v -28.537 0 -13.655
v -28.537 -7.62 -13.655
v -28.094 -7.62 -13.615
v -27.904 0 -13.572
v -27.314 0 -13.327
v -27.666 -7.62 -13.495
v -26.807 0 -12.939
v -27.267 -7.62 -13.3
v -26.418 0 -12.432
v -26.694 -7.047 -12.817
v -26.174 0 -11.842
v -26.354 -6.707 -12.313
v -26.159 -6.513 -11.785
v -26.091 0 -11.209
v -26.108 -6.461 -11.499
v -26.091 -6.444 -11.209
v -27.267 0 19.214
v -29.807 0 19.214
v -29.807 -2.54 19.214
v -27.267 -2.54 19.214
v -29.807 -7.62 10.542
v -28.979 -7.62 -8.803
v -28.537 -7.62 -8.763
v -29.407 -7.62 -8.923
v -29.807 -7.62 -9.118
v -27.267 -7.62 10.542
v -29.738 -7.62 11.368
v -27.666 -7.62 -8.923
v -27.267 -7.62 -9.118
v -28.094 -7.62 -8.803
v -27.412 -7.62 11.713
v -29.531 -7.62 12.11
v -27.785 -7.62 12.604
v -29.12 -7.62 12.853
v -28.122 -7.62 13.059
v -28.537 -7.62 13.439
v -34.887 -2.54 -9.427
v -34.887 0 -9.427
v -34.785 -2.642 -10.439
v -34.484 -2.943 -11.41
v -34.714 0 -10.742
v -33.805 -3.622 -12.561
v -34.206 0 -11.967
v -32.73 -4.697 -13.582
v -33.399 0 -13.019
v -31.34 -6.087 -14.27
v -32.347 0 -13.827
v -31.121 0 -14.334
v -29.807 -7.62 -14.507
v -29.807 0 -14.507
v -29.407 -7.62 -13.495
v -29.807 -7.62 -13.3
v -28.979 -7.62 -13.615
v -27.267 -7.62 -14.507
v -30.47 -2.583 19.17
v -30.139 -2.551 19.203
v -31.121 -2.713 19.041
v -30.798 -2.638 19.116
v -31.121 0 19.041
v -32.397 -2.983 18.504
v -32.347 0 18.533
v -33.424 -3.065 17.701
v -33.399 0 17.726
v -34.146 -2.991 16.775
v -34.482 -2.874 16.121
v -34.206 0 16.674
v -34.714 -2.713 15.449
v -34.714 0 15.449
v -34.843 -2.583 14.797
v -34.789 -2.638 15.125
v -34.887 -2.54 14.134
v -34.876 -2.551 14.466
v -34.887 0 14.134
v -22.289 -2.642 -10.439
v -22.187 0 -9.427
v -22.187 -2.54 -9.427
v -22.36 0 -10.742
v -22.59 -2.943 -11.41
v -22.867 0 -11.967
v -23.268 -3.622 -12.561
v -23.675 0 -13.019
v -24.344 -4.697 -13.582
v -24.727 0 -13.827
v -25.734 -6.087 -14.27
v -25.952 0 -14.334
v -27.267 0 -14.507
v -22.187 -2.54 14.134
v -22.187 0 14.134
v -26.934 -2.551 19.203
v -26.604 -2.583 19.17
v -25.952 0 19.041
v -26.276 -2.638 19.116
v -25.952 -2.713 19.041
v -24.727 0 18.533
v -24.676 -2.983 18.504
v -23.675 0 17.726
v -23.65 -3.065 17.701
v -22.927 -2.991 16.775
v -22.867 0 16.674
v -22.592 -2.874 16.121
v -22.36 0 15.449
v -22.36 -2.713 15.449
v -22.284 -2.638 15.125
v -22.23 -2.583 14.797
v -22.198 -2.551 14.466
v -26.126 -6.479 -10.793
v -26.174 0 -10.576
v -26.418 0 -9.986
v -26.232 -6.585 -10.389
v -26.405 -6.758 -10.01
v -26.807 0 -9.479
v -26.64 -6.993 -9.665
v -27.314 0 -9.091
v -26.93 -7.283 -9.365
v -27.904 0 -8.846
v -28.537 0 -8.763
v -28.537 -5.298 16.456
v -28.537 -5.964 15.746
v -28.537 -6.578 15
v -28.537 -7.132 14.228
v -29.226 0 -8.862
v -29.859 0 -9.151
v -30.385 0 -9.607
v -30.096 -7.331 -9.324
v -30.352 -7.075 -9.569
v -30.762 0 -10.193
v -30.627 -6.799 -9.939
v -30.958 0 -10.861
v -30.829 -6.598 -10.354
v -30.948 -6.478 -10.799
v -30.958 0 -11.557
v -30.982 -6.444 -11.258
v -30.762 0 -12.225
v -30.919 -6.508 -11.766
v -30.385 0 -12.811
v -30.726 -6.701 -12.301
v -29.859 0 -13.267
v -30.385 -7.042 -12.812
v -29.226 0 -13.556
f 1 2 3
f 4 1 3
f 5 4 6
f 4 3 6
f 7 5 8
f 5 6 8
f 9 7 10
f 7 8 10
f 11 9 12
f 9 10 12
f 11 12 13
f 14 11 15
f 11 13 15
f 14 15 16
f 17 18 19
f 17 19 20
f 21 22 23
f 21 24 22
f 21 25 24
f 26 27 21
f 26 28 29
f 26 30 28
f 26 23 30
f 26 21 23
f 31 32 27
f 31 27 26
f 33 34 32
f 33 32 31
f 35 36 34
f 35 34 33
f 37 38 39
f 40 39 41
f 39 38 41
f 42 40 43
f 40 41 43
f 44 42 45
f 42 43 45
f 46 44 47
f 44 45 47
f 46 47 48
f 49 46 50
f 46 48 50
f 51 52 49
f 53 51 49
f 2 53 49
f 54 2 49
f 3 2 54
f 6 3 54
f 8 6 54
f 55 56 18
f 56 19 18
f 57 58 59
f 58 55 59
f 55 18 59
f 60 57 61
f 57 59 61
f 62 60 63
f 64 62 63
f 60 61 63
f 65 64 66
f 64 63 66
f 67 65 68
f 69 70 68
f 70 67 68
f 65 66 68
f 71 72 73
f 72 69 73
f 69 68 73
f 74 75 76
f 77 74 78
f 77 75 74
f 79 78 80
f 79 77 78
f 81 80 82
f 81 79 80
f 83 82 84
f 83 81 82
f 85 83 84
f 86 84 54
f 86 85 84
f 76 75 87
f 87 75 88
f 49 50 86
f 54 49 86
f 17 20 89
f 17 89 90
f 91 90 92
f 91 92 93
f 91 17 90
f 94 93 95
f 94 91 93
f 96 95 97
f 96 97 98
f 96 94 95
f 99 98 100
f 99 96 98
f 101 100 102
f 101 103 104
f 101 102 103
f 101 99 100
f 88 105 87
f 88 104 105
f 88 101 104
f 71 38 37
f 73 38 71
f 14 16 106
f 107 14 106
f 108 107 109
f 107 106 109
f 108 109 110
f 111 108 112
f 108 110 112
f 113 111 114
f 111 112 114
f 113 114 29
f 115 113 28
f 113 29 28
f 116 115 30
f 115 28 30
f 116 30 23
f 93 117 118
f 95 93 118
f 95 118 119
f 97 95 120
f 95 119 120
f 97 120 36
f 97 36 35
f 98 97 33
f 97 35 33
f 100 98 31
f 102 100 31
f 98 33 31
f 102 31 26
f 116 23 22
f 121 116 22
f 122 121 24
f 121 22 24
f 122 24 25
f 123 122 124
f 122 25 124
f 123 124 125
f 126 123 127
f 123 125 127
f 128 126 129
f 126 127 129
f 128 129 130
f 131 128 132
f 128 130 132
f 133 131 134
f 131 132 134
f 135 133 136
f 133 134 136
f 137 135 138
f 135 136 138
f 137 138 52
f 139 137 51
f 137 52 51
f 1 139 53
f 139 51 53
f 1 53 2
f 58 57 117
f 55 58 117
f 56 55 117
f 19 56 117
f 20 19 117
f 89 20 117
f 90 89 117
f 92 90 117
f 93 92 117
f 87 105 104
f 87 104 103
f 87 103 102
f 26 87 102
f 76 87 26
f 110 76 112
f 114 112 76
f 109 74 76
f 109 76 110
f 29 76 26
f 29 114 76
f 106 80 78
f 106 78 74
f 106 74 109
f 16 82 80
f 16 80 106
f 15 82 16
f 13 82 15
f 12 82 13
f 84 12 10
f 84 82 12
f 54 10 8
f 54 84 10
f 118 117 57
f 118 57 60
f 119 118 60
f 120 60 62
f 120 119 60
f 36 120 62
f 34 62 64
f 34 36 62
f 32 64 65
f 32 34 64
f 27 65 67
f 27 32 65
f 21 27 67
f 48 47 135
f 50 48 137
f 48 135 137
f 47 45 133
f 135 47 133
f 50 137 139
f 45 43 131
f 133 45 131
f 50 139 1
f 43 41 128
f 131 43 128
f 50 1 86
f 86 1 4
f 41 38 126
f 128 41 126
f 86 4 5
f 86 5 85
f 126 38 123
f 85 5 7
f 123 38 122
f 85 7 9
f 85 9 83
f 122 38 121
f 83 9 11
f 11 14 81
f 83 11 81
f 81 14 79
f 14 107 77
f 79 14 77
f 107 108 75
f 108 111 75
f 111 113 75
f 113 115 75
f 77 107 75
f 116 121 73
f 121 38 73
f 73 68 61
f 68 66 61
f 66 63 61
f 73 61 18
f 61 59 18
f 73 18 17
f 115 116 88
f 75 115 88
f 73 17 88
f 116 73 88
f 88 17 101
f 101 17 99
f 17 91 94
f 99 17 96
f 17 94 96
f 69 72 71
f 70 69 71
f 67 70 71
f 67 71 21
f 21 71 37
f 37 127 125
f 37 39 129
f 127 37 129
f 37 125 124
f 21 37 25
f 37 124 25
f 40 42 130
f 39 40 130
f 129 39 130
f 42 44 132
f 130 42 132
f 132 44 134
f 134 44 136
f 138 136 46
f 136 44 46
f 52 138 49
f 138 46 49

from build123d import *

# Parameters (mm, degrees)
F0_W        = 12.7
F0_H        = 33.7210557661
F1_DEPTH    = 7.62
F3_DEPTH    = 25.4
F4_T1_DEPTH = 59.8493549238
F4_T3_DEPTH = 38.8282991577
F5_T1_DEPTH = 27.94
F5_T3_DEPTH = 23.4635149399
F5_T5_DEPTH = 23.4635149399


# Not quite as in the source:
# - a fillet or chamfer that OpenCascade refuses, or shapes differently, is made with other operations: its cross-section is extruded or revolved along the edge and cut away or added


with BuildPart() as f1:
    # F0 (on Front) → F1 (new body)
    with BuildSketch(Plane.XZ):
        with Locations((-28.5366901662, 2.3533813655)):
            Rectangle(F0_W, F0_H)
    extrude(amount=F1_DEPTH)

    # F2 (on face) → F3 (cut)
    with BuildSketch(Plane.XZ.offset(7.62)):
        with BuildLine():
            ThreePointArc((-28.5366901662, -8.7627890215), (-30.9828768324, -11.2089756876), (-28.5366901662, -13.6551623538))
            Line((-28.5366901662, -13.6551623538), (-28.5366901662, -8.7627890215))
        make_face()
        with BuildLine():
            Line((-28.5366901662, -8.7627890215), (-28.5366901662, -13.6551623538))
            ThreePointArc((-28.5366901662, -13.6551623538), (-26.8069749865, -12.9386908673), (-26.0905035001, -11.2089756876))
            ThreePointArc((-26.0905035001, -11.2089756876), (-26.8069749865, -9.4792605079), (-28.5366901662, -8.7627890215))
        make_face()
    extrude(amount=-F3_DEPTH, mode=Mode.SUBTRACT)

    # F4: chamfer of 5.08 on 3 edges, made by hand

    # F4_s2 → F4_t1 (cut)
    with BuildSketch(Plane.XY.offset(-27.5712960964)):
        Polygon((-22.1866901662, -2.54), (-27.2666901662, -7.62), (-22.1866901662, -7.62), align=None)
        Polygon((-34.8866901662, -2.54), (-29.8066901662, -7.62), (-34.8866901662, -7.62), align=None)
    extrude(amount=F4_T1_DEPTH, mode=Mode.SUBTRACT)

    # F4_s4 → F4_t3 (cut)
    with BuildSketch(Plane.YZ.offset(-47.9508397451)):
        Polygon((-2.54, 19.2139092486), (-7.62, 14.1339092486), (-7.62, 19.2139092486), align=None)
    extrude(amount=F4_T3_DEPTH, mode=Mode.SUBTRACT)

    # F5: fillet of radius 5.08 on 6 edges, made by hand

    # F5_s2 → F5_t1 (cut)
    with BuildSketch(Plane.XZ.offset(-12.7)):
        with BuildLine():
            ThreePointArc((-29.8066901662, 19.2139092486), (-33.3987926146, 17.726011697), (-34.8866901662, 14.1339092486))
            Line((-34.8866901662, 14.1339092486), (-34.8866901662, 19.2139092486))
            Line((-34.8866901662, 19.2139092486), (-29.8066901662, 19.2139092486))
        make_face()
        with BuildLine():
            ThreePointArc((-27.2666901662, 19.2139092486), (-23.6745877178, 17.726011697), (-22.1866901662, 14.1339092486))
            Line((-22.1866901662, 14.1339092486), (-22.1866901662, 19.2139092486))
            Line((-22.1866901662, 19.2139092486), (-27.2666901662, 19.2139092486))
        make_face()
        with BuildLine():
            ThreePointArc((-22.1866901662, -9.4271465175), (-23.6745877178, -13.0192489659), (-27.2666901662, -14.5071465175))
            Line((-27.2666901662, -14.5071465175), (-22.1866901662, -14.5071465175))
            Line((-22.1866901662, -14.5071465175), (-22.1866901662, -9.4271465175))
        make_face()
        with BuildLine():
            ThreePointArc((-34.8866901662, -9.4271465175), (-33.3987926146, -13.0192489659), (-29.8066901662, -14.5071465175))
            Line((-29.8066901662, -14.5071465175), (-34.8866901662, -14.5071465175))
            Line((-34.8866901662, -14.5071465175), (-34.8866901662, -9.4271465175))
        make_face()
    extrude(amount=F5_T1_DEPTH, mode=Mode.SUBTRACT)

    # F5_s4 → F5_t3 (cut)
    with BuildSketch(Plane(origin=(-11.1509269725, -11.1509269725, -11.1509269725), x_dir=(-0.7071067812, 0.7071067812, 0), z_dir=(0.5773502692, 0.5773502692, 0.5773502692))):
        with BuildLine():
            ThreePointArc((16.4323078444, 27.2491898807), (14.5728987932, 25.3897808294), (13.8923078444, 22.8497808294))
            Line((13.8923078444, 22.8497808294), (13.8923078444, 25.7827201969))
            Line((13.8923078444, 25.7827201969), (16.4323078444, 27.2491898807))
        make_face()
    extrude(amount=F5_T3_DEPTH, mode=Mode.SUBTRACT)

    # F5_s6 → F5_t5 (cut)
    with BuildSketch(Plane(origin=(-7.8735331383, 7.8735331383, 7.8735331383), x_dir=(-0.7071067812, -0.7071067812, 0), z_dir=(-0.5773502692, 0.5773502692, 0.5773502692))):
        with BuildLine():
            ThreePointArc((23.9246664139, 3.949079929), (25.7840754651, 2.0896708777), (26.4646664139, -0.4503291223))
            Line((26.4646664139, -0.4503291223), (26.4646664139, 2.4826102452))
            Line((26.4646664139, 2.4826102452), (23.9246664139, 3.949079929))
        make_face()
    extrude(amount=F5_T5_DEPTH, mode=Mode.SUBTRACT)


solid = f1.part
